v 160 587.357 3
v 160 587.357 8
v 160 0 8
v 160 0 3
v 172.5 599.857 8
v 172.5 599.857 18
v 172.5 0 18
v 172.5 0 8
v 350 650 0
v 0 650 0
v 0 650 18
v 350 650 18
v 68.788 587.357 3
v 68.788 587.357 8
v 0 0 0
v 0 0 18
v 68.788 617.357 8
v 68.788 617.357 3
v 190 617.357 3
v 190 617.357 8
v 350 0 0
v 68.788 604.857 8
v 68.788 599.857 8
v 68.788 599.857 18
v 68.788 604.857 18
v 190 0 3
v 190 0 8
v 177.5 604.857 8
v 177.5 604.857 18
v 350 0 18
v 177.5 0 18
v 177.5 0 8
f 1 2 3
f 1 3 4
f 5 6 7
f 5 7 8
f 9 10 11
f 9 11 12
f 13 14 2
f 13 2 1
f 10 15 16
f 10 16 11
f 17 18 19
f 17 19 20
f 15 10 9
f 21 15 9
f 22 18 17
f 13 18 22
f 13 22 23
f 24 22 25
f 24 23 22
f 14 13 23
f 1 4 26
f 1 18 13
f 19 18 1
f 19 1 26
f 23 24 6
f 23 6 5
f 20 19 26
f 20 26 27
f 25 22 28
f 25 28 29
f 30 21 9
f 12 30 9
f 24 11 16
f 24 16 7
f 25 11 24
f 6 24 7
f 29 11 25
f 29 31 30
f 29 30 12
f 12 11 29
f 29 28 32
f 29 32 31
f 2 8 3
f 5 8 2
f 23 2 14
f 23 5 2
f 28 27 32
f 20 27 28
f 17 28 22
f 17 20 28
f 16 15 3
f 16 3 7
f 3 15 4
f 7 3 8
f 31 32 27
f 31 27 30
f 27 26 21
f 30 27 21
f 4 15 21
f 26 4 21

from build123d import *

# Parameters (mm, degrees)
SKICA1_W                = 350
SKICA1_H                = 650
P_IDAT_VYSUNUT_M2_DEPTH = 18


with BuildPart() as part:
    # Skica1 → Přidat vysunutím2 (new body)
    with BuildSketch(Plane.XY):
        with Locations((175, 325)):
            Rectangle(SKICA1_W, SKICA1_H)
    extrude(amount=P_IDAT_VYSUNUT_M2_DEPTH)

    # Odebrat tažením po křivce8: sweep along a path in cesta
    with BuildLine(Plane.XY.offset(18)) as odebrat_ta_en_m_po_k_ivce8_path:
        Line((175, 0), (175, 602.357194164))
        Line((175, 602.357194164), (68.787703731, 602.357194164))
    # profil na frezu → Odebrat tažením po křivce8 (sweep, cut)
    with BuildSketch(Plane.XZ):
        Polygon((190, 3), (190, 8), (177.5, 8), (177.5, 18), (172.5, 18), (172.5, 8), (160, 8), (160, 3), align=None)
    sweep(path=odebrat_ta_en_m_po_k_ivce8_path.line, transition=Transition.RIGHT, mode=Mode.SUBTRACT)


solid = part.part
